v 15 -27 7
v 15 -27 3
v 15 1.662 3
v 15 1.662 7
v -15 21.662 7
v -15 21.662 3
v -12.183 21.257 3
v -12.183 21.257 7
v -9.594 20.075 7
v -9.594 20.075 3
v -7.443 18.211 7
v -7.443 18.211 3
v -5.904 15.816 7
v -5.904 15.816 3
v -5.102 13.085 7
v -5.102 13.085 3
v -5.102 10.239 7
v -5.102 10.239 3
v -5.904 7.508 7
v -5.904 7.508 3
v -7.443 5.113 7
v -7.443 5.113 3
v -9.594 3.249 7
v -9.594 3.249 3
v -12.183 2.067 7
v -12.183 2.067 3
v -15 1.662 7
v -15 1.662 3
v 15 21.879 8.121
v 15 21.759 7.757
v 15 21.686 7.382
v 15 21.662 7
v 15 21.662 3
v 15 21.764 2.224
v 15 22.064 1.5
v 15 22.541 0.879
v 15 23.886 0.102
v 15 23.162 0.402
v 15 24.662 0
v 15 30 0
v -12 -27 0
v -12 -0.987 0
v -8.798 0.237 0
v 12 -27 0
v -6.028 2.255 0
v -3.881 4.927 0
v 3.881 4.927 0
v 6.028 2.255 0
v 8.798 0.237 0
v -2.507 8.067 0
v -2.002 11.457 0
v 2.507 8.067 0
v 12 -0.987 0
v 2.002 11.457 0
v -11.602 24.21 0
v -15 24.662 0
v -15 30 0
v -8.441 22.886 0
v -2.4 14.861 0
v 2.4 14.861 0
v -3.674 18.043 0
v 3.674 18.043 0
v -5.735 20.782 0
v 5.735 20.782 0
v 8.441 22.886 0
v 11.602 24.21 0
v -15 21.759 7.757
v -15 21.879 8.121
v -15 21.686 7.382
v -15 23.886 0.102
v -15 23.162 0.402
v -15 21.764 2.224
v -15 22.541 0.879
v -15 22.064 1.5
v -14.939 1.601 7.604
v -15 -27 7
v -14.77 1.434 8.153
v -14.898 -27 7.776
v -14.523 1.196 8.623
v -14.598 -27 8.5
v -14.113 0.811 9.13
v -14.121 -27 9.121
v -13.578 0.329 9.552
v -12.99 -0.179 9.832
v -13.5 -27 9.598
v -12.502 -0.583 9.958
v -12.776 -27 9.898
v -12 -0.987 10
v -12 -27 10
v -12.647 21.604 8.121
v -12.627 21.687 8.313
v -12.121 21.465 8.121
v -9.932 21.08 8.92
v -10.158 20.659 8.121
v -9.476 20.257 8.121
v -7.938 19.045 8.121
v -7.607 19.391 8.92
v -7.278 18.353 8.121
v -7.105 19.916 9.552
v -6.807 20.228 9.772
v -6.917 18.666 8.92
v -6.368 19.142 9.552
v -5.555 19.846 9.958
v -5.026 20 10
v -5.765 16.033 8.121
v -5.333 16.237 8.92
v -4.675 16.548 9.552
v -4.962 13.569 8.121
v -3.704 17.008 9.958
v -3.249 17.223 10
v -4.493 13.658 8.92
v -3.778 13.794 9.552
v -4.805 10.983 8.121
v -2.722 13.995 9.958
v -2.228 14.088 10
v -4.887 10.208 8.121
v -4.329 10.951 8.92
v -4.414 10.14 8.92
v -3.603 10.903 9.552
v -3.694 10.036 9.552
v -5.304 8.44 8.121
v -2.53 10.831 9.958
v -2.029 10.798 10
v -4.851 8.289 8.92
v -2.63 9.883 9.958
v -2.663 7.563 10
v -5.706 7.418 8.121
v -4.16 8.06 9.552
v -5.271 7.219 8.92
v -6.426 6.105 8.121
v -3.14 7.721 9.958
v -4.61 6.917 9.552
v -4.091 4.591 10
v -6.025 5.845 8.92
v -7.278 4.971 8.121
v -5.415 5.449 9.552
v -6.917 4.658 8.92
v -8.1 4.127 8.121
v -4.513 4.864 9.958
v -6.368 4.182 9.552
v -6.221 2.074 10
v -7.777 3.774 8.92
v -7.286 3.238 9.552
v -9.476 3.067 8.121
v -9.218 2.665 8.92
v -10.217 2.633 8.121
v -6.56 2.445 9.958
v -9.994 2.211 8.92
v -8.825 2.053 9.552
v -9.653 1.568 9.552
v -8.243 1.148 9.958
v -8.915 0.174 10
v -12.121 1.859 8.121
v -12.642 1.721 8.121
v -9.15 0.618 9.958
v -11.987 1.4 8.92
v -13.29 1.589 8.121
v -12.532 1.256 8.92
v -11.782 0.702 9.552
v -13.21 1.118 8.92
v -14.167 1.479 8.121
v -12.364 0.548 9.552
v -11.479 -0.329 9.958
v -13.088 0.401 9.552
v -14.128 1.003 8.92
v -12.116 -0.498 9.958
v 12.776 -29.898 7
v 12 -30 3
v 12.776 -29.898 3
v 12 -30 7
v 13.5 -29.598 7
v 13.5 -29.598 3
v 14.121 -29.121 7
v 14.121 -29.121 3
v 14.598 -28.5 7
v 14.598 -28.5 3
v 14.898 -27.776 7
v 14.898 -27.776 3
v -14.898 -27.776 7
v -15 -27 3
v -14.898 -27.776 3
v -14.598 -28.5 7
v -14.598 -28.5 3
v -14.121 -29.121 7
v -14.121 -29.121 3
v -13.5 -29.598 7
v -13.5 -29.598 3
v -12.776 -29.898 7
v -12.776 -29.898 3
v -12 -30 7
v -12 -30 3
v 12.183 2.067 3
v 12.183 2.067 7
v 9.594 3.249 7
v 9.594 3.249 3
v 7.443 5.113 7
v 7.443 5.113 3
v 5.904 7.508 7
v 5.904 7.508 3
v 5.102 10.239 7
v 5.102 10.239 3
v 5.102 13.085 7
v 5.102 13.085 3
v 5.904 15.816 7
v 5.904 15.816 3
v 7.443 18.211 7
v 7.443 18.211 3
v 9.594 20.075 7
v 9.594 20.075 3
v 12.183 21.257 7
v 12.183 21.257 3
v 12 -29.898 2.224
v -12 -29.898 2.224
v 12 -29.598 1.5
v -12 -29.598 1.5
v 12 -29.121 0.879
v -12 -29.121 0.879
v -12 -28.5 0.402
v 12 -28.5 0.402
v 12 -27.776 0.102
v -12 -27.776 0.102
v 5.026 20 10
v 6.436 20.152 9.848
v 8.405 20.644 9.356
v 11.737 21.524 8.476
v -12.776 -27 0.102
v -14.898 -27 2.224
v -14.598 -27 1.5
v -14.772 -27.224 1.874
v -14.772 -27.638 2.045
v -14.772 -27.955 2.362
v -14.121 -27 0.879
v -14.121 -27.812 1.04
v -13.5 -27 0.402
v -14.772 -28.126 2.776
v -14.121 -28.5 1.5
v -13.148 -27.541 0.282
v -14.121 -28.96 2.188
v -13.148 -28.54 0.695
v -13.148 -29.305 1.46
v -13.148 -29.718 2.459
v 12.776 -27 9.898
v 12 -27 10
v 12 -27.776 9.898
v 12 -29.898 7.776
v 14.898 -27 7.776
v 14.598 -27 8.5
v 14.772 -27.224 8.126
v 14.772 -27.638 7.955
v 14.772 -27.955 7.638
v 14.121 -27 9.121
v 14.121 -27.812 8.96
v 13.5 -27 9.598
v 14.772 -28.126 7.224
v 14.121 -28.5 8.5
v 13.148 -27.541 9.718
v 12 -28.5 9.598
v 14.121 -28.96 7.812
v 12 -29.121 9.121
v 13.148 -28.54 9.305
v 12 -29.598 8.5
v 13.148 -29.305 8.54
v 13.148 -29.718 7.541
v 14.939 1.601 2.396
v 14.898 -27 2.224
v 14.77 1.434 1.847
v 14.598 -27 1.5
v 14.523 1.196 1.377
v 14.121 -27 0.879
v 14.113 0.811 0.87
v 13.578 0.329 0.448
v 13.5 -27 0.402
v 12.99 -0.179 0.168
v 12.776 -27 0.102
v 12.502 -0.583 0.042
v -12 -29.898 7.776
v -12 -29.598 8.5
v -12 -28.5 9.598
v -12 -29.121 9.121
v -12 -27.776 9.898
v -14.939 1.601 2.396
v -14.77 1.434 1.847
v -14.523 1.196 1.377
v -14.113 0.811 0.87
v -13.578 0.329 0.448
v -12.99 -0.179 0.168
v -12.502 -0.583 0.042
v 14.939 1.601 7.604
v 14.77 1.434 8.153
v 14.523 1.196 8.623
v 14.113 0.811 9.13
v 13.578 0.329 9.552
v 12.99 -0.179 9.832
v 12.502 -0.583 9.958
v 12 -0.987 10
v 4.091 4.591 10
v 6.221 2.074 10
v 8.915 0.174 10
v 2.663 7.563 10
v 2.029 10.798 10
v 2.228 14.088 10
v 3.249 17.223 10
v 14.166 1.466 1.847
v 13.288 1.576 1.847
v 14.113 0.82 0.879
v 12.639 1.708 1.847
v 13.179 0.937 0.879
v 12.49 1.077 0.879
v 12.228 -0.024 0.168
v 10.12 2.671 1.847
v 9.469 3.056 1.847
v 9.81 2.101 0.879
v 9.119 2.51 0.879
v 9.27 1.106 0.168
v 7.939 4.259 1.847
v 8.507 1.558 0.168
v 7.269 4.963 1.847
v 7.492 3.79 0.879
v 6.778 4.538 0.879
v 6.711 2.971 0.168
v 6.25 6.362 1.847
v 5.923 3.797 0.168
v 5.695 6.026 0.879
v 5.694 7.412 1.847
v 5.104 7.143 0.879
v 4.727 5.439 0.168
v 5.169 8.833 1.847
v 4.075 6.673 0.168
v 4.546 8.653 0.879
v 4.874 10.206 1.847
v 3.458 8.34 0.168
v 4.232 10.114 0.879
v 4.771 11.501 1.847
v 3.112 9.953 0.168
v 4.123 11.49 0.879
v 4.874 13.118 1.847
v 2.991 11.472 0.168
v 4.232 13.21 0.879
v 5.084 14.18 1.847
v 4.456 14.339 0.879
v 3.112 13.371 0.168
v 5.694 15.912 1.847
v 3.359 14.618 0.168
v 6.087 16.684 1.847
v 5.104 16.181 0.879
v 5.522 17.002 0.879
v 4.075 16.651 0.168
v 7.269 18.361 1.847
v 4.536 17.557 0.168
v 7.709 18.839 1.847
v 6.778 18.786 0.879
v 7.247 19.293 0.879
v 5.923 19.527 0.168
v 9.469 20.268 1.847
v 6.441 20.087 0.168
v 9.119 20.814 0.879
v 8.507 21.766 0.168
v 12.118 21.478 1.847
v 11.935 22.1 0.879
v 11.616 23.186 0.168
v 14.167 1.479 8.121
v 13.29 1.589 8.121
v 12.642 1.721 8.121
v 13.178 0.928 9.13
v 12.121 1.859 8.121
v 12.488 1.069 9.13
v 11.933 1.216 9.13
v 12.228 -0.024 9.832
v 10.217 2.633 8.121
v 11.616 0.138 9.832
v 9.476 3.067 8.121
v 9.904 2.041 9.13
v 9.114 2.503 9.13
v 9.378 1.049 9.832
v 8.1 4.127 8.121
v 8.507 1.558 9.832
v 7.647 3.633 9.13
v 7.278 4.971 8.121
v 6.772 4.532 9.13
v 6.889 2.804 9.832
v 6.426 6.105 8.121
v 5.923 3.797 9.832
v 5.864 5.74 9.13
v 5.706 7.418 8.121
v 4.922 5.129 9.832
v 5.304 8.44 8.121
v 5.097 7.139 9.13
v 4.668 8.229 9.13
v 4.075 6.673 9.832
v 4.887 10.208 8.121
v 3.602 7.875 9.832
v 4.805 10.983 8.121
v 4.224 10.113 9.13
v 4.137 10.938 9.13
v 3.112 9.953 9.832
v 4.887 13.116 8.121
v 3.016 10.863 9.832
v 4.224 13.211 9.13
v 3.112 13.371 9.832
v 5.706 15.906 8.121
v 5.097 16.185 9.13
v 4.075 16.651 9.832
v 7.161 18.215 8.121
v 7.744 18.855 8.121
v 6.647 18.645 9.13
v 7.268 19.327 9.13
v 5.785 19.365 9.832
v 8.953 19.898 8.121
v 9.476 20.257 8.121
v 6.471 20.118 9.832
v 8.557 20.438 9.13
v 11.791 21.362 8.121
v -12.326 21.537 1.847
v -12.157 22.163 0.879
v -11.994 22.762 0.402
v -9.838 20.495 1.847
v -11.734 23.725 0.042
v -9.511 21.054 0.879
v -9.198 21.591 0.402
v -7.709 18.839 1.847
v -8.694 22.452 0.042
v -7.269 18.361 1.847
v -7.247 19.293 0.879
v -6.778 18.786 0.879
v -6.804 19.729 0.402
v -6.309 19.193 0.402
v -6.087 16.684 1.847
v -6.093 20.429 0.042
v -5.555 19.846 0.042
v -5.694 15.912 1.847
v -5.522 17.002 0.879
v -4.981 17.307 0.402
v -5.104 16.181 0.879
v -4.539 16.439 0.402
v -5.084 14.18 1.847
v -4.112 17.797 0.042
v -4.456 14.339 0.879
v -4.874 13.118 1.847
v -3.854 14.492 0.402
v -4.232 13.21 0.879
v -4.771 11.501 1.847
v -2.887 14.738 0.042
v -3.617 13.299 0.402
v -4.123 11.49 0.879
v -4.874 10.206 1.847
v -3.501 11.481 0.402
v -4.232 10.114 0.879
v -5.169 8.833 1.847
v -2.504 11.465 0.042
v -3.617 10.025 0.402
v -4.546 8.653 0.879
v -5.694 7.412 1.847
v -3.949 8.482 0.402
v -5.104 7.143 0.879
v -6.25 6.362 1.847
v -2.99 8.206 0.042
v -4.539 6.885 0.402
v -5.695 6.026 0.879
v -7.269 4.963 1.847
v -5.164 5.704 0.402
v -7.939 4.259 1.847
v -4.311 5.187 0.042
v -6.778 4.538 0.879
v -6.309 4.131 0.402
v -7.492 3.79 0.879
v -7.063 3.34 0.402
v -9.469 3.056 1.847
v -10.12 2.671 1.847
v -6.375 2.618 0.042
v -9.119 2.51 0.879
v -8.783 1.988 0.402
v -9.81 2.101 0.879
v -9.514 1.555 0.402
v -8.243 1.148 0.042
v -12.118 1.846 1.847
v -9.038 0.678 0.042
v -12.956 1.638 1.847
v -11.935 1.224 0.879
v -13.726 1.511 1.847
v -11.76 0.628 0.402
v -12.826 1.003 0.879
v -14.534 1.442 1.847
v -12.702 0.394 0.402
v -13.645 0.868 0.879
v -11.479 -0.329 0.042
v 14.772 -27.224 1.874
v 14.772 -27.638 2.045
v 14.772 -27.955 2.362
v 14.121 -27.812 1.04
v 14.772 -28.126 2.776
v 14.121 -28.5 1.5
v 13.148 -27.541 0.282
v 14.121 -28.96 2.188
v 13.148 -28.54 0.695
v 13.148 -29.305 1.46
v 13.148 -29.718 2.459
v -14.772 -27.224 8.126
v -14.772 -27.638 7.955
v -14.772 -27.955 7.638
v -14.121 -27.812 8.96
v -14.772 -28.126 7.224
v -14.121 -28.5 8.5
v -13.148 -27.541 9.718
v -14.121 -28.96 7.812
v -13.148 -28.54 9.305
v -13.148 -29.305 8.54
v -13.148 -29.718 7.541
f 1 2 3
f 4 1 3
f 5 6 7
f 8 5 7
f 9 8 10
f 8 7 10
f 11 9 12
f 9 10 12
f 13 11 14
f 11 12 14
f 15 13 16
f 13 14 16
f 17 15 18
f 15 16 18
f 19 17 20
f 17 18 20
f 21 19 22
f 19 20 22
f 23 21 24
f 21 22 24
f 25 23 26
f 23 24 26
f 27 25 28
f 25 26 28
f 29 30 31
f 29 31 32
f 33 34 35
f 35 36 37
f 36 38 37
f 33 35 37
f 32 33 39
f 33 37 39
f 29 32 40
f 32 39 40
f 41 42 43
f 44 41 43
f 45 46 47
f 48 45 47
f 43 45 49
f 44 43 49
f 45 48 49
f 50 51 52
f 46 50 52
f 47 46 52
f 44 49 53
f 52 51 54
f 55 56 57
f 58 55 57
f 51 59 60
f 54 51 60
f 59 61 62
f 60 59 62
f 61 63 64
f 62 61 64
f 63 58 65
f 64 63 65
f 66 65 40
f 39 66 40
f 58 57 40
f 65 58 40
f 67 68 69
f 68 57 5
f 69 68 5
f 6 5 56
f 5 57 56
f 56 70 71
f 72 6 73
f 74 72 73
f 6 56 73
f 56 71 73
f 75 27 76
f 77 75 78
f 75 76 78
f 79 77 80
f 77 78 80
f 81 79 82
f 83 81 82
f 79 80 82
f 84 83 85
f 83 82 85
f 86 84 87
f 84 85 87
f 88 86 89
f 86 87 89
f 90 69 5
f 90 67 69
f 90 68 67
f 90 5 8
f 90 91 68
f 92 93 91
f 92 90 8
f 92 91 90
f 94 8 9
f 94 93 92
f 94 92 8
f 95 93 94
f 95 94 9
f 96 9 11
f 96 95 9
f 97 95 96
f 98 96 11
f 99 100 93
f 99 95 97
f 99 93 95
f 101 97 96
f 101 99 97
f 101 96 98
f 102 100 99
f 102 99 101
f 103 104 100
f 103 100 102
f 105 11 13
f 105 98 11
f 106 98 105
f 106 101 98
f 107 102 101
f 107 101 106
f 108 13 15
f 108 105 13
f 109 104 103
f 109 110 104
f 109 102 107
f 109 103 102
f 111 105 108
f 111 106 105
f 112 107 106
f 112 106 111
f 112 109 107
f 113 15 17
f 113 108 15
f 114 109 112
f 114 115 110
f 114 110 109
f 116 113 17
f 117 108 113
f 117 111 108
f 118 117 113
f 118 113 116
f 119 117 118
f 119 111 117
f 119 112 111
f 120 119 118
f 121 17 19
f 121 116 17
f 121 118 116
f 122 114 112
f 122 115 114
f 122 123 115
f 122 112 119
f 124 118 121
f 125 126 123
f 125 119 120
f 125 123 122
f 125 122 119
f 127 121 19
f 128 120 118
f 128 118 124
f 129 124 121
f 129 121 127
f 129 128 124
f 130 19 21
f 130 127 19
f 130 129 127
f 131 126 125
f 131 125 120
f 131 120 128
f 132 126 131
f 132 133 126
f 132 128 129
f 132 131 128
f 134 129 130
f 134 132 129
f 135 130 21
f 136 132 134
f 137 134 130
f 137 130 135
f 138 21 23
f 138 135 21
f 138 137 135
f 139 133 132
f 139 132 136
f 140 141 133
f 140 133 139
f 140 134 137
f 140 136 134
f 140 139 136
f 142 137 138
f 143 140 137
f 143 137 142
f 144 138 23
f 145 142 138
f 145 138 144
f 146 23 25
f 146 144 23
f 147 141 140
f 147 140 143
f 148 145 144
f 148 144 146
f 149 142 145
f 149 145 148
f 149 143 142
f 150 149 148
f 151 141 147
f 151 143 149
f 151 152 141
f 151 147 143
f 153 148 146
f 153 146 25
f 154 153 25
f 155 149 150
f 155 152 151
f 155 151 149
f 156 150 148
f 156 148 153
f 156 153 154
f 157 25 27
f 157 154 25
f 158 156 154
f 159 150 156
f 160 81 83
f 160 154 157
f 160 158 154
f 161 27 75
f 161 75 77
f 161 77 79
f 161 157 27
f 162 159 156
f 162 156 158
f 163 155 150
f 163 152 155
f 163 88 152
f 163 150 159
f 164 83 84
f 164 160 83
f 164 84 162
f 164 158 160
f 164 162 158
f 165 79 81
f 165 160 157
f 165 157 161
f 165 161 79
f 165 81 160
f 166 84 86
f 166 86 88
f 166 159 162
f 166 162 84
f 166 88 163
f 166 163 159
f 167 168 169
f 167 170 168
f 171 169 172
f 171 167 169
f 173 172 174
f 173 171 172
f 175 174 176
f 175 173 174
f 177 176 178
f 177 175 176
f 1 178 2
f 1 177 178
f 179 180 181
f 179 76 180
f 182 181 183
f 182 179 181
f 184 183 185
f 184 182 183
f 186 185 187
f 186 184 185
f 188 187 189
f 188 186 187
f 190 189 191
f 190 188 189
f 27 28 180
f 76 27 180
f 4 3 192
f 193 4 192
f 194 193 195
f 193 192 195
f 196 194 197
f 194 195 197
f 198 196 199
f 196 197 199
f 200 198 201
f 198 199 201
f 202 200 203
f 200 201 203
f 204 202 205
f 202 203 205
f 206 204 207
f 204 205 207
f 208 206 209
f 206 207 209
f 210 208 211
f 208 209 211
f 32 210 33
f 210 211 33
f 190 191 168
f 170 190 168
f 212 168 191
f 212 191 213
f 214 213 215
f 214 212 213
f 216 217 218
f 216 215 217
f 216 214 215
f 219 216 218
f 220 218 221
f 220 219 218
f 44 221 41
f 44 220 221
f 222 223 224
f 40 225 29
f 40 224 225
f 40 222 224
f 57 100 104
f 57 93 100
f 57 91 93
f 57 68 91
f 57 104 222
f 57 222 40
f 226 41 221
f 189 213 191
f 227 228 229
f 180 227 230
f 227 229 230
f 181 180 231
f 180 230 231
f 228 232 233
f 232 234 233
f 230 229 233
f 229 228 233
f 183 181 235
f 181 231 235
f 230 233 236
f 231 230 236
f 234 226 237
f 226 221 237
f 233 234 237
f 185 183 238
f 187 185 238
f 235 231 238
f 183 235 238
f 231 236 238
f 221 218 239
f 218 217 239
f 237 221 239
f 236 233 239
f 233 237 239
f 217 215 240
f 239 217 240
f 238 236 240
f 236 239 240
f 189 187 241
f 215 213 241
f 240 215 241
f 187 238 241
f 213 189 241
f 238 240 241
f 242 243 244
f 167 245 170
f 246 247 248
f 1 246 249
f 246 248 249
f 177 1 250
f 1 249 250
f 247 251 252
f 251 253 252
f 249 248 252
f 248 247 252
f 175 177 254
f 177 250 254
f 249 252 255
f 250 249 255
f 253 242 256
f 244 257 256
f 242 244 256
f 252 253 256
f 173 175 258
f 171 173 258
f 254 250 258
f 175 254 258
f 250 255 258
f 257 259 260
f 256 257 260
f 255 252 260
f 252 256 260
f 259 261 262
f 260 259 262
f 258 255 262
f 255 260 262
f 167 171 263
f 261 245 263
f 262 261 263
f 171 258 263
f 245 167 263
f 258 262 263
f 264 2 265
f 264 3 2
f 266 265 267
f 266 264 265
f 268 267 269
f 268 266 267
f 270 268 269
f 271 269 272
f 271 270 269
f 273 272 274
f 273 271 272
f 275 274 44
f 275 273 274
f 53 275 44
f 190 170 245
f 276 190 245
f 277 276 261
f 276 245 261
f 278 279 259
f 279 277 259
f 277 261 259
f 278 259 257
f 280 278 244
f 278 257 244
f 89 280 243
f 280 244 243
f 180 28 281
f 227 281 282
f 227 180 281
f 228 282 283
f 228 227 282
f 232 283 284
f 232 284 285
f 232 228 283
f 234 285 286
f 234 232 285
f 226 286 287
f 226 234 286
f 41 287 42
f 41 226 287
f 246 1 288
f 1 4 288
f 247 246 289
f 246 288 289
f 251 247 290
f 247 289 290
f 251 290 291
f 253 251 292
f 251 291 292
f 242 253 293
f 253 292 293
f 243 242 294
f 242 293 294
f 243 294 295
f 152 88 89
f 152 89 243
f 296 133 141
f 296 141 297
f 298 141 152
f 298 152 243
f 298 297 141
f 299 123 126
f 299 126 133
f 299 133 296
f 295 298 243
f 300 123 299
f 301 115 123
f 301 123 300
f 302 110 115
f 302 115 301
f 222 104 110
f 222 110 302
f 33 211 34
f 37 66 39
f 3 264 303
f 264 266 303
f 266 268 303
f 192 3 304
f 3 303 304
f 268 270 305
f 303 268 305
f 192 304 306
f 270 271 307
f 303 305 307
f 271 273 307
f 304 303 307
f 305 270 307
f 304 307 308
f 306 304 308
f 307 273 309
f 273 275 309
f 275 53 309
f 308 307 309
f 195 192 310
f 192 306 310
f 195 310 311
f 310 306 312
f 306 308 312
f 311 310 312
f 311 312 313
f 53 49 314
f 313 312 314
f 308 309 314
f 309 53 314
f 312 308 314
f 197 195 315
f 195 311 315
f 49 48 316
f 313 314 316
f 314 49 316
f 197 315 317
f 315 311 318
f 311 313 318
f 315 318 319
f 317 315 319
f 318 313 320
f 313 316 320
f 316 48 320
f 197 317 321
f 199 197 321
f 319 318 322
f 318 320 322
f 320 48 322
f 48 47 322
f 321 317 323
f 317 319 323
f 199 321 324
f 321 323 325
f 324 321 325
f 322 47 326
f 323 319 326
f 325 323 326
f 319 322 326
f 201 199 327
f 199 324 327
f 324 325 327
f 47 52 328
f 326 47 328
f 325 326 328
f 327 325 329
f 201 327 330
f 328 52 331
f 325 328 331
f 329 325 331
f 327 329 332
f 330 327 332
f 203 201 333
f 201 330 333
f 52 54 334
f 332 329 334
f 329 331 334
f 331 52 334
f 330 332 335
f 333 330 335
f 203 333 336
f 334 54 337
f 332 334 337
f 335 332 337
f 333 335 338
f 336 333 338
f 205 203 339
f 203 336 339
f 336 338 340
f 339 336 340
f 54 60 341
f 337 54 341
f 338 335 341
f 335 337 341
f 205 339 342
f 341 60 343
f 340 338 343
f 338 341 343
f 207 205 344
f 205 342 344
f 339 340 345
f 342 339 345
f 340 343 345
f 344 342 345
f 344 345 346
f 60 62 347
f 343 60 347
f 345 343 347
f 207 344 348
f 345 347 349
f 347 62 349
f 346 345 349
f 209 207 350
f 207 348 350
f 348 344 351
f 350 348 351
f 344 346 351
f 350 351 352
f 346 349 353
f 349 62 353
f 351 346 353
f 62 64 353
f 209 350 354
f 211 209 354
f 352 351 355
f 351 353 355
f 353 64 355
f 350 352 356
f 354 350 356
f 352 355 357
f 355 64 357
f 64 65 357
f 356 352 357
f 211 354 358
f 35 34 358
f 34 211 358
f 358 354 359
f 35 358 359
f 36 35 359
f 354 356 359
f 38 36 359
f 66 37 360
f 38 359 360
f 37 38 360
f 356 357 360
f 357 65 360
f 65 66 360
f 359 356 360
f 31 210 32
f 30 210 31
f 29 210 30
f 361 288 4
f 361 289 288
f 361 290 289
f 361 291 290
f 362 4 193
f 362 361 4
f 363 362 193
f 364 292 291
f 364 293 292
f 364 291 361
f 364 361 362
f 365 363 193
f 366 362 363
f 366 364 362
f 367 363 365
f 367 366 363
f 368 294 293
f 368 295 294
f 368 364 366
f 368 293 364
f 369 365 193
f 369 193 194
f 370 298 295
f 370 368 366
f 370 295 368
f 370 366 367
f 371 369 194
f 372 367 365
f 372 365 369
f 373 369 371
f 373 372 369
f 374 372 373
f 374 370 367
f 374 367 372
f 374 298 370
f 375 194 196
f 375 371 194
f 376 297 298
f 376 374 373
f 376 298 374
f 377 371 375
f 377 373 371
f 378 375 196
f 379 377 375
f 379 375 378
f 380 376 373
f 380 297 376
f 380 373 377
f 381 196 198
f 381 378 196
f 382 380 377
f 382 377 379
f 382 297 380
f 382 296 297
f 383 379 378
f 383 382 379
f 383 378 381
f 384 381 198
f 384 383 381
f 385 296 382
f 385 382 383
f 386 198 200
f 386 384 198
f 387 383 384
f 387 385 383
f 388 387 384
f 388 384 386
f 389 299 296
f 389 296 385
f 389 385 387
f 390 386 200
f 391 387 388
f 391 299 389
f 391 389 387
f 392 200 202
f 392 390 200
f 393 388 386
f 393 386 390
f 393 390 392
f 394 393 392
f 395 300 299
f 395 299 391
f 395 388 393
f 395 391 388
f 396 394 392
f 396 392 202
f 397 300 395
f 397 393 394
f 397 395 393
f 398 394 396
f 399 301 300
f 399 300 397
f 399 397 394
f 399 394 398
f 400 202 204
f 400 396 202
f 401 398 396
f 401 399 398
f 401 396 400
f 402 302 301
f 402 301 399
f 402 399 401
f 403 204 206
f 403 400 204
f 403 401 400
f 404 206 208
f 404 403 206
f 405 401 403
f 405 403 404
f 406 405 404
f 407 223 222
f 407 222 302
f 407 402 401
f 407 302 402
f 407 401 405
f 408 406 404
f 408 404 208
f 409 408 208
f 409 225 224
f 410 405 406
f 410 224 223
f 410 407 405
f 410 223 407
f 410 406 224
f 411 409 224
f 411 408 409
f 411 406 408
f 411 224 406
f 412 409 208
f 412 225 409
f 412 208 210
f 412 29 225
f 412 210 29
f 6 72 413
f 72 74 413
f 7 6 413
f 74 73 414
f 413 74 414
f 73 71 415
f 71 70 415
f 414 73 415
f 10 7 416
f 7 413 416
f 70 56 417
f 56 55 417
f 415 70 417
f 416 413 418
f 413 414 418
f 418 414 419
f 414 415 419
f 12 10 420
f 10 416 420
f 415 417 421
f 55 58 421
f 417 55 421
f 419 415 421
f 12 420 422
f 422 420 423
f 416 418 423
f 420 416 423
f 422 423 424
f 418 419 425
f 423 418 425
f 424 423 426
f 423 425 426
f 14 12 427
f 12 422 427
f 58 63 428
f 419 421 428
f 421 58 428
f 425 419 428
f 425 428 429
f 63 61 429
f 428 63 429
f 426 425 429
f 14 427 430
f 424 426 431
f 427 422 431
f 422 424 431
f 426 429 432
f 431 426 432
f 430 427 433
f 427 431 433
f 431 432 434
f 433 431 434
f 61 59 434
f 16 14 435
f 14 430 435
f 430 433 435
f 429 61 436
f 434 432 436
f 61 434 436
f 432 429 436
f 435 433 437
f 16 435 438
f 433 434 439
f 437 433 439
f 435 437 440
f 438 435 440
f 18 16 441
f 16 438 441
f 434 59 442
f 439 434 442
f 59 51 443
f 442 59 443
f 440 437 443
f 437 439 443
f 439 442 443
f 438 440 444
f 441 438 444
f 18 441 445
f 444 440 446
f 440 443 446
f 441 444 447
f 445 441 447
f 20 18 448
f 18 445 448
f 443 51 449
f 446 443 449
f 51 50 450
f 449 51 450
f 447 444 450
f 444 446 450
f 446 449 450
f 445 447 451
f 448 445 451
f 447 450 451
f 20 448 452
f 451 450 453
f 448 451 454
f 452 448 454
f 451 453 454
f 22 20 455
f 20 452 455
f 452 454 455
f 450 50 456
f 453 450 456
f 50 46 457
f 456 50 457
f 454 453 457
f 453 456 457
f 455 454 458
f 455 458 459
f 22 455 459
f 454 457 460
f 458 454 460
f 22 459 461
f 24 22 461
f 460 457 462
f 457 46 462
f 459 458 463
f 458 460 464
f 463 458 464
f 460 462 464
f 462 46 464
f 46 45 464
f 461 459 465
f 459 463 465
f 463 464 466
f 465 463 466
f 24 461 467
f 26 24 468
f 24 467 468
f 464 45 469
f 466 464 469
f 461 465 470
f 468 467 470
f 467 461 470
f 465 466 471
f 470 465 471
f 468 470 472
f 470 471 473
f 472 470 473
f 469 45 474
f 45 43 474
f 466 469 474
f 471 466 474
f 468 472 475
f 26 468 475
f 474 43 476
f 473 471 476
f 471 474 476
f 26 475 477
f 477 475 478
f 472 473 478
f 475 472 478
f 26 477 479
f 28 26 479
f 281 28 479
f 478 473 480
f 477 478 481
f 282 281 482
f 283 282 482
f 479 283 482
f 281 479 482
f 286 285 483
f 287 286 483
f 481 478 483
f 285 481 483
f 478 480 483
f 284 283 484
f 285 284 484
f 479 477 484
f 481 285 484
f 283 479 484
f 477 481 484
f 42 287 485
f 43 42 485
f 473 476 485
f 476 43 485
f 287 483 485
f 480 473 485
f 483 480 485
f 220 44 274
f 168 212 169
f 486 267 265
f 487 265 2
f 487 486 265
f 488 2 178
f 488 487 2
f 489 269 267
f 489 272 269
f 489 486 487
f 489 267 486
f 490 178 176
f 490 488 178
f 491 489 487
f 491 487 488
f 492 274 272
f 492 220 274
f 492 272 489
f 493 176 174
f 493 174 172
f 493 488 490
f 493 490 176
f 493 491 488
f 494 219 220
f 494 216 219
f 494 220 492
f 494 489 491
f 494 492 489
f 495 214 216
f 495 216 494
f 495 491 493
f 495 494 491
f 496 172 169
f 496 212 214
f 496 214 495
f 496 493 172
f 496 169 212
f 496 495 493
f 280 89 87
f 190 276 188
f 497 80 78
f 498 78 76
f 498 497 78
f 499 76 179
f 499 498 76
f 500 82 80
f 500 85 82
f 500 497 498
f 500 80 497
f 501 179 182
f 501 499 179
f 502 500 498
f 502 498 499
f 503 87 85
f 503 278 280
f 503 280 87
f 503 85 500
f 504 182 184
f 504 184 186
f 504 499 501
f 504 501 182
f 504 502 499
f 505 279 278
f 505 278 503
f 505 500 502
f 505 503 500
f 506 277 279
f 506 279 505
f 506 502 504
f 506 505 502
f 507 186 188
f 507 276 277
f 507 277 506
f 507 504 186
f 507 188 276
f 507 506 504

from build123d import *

# Parameters (mm, degrees)
F1_DEPTH    = 10
F2_R        = 3
F3_T1_DEPTH = 81.4336597593


# Not quite as in the source:
# - a fillet or chamfer that OpenCascade refuses, or shapes differently, is made with other operations: its cross-section is extruded or revolved along the edge and cut away or added


with BuildPart() as f1:
    # F0 (on Top) → F1 (new body)
    with BuildSketch(Plane.XY):
        with BuildLine():
            Line((15, 30), (-15, 30))
            Line((-15, 30), (-15, 21.6620222107))
            ThreePointArc((-15, 21.6620222107), (-5, 11.6620222107), (-15, 1.6620222107))
            Line((-15, 1.6620222107), (-15, -30))
            Line((-15, -30), (15, -30))
            Line((15, -30), (15, 1.6620222107))
            ThreePointArc((15, 1.6620222107), (5, 11.6620222107), (15, 21.6620222107))
            Line((15, 21.6620222107), (15, 30))
        make_face()
    extrude(amount=F1_DEPTH)

    # F2
    f2_edges = [f1.edges().sort_by_distance(p)[0] for p in [
        (-5, 11.662022, 10),
        (5, 11.662022, 10),
        (5, 11.662022, 0),
        (-5, 11.662022, 0),
        (0, -30, 0),
        (-15, -14.168989, 0),
        (15, -14.168989, 0),
        (0, -30, 10),
        (15, -14.168989, 10),
        (-15, -14.168989, 10),
        (15, -30, 5),
        (-15, -30, 5),
    ]]
    fillet(f2_edges, radius=F2_R)

    # F3: chamfer of 10 on 1 edges, made by hand

    # F3_s2 → F3_t1 (cut)
    with BuildSketch(Plane.YZ.offset(-40.7168298797)):
        Polygon((20, 10), (30, 0), (30, 10), align=None)
    extrude(amount=F3_T1_DEPTH, mode=Mode.SUBTRACT)


solid = f1.part
